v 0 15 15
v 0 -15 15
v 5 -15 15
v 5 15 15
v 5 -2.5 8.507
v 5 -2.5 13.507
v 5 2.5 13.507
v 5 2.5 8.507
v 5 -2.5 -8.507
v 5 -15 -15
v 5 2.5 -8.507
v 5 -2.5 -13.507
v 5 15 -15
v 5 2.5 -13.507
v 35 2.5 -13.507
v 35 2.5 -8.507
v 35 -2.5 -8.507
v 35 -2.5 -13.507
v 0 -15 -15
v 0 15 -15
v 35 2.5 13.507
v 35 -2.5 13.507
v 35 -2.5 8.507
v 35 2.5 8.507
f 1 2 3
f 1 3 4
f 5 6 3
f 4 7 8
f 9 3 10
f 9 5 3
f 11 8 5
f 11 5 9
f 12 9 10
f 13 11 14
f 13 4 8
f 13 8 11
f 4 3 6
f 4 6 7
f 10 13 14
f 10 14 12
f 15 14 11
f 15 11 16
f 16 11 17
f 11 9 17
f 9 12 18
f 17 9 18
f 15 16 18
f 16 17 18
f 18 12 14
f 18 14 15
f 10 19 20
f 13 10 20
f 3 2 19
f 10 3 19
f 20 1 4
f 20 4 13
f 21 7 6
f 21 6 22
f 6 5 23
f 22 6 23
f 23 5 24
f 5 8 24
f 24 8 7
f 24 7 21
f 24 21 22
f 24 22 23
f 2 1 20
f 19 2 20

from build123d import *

# Parameters (mm, degrees)
SKETCH1_W           = 30
SKETCH1_H           = 30
BOSS_EXTRUDE1_DEPTH = 5
SKETCH2_W           = 30
SKETCH2_H           = 5
BOSS_EXTRUDE2_DEPTH = 2.5


with BuildPart() as part:
    # Sketch1 → Boss-Extrude1 (new body)
    with BuildSketch(Plane(origin=(0, 0, 0), x_dir=(0, 0, -1), z_dir=(1, 0, 0))):
        Rectangle(SKETCH1_W, SKETCH1_H)
    extrude(amount=BOSS_EXTRUDE1_DEPTH)

    # Sketch2 → Boss-Extrude2 (add, symmetric)
    with BuildSketch(Plane(origin=(0, 0, 0), x_dir=(1, 0, 0), z_dir=(0, 1, 0))):
        with Locations((20, 11.007087783)):
            Rectangle(SKETCH2_W, SKETCH2_H)
        with Locations((20, -11.007087783)):
            Rectangle(SKETCH2_W, SKETCH2_H)
    extrude(amount=BOSS_EXTRUDE2_DEPTH, both=True)


solid = part.part
